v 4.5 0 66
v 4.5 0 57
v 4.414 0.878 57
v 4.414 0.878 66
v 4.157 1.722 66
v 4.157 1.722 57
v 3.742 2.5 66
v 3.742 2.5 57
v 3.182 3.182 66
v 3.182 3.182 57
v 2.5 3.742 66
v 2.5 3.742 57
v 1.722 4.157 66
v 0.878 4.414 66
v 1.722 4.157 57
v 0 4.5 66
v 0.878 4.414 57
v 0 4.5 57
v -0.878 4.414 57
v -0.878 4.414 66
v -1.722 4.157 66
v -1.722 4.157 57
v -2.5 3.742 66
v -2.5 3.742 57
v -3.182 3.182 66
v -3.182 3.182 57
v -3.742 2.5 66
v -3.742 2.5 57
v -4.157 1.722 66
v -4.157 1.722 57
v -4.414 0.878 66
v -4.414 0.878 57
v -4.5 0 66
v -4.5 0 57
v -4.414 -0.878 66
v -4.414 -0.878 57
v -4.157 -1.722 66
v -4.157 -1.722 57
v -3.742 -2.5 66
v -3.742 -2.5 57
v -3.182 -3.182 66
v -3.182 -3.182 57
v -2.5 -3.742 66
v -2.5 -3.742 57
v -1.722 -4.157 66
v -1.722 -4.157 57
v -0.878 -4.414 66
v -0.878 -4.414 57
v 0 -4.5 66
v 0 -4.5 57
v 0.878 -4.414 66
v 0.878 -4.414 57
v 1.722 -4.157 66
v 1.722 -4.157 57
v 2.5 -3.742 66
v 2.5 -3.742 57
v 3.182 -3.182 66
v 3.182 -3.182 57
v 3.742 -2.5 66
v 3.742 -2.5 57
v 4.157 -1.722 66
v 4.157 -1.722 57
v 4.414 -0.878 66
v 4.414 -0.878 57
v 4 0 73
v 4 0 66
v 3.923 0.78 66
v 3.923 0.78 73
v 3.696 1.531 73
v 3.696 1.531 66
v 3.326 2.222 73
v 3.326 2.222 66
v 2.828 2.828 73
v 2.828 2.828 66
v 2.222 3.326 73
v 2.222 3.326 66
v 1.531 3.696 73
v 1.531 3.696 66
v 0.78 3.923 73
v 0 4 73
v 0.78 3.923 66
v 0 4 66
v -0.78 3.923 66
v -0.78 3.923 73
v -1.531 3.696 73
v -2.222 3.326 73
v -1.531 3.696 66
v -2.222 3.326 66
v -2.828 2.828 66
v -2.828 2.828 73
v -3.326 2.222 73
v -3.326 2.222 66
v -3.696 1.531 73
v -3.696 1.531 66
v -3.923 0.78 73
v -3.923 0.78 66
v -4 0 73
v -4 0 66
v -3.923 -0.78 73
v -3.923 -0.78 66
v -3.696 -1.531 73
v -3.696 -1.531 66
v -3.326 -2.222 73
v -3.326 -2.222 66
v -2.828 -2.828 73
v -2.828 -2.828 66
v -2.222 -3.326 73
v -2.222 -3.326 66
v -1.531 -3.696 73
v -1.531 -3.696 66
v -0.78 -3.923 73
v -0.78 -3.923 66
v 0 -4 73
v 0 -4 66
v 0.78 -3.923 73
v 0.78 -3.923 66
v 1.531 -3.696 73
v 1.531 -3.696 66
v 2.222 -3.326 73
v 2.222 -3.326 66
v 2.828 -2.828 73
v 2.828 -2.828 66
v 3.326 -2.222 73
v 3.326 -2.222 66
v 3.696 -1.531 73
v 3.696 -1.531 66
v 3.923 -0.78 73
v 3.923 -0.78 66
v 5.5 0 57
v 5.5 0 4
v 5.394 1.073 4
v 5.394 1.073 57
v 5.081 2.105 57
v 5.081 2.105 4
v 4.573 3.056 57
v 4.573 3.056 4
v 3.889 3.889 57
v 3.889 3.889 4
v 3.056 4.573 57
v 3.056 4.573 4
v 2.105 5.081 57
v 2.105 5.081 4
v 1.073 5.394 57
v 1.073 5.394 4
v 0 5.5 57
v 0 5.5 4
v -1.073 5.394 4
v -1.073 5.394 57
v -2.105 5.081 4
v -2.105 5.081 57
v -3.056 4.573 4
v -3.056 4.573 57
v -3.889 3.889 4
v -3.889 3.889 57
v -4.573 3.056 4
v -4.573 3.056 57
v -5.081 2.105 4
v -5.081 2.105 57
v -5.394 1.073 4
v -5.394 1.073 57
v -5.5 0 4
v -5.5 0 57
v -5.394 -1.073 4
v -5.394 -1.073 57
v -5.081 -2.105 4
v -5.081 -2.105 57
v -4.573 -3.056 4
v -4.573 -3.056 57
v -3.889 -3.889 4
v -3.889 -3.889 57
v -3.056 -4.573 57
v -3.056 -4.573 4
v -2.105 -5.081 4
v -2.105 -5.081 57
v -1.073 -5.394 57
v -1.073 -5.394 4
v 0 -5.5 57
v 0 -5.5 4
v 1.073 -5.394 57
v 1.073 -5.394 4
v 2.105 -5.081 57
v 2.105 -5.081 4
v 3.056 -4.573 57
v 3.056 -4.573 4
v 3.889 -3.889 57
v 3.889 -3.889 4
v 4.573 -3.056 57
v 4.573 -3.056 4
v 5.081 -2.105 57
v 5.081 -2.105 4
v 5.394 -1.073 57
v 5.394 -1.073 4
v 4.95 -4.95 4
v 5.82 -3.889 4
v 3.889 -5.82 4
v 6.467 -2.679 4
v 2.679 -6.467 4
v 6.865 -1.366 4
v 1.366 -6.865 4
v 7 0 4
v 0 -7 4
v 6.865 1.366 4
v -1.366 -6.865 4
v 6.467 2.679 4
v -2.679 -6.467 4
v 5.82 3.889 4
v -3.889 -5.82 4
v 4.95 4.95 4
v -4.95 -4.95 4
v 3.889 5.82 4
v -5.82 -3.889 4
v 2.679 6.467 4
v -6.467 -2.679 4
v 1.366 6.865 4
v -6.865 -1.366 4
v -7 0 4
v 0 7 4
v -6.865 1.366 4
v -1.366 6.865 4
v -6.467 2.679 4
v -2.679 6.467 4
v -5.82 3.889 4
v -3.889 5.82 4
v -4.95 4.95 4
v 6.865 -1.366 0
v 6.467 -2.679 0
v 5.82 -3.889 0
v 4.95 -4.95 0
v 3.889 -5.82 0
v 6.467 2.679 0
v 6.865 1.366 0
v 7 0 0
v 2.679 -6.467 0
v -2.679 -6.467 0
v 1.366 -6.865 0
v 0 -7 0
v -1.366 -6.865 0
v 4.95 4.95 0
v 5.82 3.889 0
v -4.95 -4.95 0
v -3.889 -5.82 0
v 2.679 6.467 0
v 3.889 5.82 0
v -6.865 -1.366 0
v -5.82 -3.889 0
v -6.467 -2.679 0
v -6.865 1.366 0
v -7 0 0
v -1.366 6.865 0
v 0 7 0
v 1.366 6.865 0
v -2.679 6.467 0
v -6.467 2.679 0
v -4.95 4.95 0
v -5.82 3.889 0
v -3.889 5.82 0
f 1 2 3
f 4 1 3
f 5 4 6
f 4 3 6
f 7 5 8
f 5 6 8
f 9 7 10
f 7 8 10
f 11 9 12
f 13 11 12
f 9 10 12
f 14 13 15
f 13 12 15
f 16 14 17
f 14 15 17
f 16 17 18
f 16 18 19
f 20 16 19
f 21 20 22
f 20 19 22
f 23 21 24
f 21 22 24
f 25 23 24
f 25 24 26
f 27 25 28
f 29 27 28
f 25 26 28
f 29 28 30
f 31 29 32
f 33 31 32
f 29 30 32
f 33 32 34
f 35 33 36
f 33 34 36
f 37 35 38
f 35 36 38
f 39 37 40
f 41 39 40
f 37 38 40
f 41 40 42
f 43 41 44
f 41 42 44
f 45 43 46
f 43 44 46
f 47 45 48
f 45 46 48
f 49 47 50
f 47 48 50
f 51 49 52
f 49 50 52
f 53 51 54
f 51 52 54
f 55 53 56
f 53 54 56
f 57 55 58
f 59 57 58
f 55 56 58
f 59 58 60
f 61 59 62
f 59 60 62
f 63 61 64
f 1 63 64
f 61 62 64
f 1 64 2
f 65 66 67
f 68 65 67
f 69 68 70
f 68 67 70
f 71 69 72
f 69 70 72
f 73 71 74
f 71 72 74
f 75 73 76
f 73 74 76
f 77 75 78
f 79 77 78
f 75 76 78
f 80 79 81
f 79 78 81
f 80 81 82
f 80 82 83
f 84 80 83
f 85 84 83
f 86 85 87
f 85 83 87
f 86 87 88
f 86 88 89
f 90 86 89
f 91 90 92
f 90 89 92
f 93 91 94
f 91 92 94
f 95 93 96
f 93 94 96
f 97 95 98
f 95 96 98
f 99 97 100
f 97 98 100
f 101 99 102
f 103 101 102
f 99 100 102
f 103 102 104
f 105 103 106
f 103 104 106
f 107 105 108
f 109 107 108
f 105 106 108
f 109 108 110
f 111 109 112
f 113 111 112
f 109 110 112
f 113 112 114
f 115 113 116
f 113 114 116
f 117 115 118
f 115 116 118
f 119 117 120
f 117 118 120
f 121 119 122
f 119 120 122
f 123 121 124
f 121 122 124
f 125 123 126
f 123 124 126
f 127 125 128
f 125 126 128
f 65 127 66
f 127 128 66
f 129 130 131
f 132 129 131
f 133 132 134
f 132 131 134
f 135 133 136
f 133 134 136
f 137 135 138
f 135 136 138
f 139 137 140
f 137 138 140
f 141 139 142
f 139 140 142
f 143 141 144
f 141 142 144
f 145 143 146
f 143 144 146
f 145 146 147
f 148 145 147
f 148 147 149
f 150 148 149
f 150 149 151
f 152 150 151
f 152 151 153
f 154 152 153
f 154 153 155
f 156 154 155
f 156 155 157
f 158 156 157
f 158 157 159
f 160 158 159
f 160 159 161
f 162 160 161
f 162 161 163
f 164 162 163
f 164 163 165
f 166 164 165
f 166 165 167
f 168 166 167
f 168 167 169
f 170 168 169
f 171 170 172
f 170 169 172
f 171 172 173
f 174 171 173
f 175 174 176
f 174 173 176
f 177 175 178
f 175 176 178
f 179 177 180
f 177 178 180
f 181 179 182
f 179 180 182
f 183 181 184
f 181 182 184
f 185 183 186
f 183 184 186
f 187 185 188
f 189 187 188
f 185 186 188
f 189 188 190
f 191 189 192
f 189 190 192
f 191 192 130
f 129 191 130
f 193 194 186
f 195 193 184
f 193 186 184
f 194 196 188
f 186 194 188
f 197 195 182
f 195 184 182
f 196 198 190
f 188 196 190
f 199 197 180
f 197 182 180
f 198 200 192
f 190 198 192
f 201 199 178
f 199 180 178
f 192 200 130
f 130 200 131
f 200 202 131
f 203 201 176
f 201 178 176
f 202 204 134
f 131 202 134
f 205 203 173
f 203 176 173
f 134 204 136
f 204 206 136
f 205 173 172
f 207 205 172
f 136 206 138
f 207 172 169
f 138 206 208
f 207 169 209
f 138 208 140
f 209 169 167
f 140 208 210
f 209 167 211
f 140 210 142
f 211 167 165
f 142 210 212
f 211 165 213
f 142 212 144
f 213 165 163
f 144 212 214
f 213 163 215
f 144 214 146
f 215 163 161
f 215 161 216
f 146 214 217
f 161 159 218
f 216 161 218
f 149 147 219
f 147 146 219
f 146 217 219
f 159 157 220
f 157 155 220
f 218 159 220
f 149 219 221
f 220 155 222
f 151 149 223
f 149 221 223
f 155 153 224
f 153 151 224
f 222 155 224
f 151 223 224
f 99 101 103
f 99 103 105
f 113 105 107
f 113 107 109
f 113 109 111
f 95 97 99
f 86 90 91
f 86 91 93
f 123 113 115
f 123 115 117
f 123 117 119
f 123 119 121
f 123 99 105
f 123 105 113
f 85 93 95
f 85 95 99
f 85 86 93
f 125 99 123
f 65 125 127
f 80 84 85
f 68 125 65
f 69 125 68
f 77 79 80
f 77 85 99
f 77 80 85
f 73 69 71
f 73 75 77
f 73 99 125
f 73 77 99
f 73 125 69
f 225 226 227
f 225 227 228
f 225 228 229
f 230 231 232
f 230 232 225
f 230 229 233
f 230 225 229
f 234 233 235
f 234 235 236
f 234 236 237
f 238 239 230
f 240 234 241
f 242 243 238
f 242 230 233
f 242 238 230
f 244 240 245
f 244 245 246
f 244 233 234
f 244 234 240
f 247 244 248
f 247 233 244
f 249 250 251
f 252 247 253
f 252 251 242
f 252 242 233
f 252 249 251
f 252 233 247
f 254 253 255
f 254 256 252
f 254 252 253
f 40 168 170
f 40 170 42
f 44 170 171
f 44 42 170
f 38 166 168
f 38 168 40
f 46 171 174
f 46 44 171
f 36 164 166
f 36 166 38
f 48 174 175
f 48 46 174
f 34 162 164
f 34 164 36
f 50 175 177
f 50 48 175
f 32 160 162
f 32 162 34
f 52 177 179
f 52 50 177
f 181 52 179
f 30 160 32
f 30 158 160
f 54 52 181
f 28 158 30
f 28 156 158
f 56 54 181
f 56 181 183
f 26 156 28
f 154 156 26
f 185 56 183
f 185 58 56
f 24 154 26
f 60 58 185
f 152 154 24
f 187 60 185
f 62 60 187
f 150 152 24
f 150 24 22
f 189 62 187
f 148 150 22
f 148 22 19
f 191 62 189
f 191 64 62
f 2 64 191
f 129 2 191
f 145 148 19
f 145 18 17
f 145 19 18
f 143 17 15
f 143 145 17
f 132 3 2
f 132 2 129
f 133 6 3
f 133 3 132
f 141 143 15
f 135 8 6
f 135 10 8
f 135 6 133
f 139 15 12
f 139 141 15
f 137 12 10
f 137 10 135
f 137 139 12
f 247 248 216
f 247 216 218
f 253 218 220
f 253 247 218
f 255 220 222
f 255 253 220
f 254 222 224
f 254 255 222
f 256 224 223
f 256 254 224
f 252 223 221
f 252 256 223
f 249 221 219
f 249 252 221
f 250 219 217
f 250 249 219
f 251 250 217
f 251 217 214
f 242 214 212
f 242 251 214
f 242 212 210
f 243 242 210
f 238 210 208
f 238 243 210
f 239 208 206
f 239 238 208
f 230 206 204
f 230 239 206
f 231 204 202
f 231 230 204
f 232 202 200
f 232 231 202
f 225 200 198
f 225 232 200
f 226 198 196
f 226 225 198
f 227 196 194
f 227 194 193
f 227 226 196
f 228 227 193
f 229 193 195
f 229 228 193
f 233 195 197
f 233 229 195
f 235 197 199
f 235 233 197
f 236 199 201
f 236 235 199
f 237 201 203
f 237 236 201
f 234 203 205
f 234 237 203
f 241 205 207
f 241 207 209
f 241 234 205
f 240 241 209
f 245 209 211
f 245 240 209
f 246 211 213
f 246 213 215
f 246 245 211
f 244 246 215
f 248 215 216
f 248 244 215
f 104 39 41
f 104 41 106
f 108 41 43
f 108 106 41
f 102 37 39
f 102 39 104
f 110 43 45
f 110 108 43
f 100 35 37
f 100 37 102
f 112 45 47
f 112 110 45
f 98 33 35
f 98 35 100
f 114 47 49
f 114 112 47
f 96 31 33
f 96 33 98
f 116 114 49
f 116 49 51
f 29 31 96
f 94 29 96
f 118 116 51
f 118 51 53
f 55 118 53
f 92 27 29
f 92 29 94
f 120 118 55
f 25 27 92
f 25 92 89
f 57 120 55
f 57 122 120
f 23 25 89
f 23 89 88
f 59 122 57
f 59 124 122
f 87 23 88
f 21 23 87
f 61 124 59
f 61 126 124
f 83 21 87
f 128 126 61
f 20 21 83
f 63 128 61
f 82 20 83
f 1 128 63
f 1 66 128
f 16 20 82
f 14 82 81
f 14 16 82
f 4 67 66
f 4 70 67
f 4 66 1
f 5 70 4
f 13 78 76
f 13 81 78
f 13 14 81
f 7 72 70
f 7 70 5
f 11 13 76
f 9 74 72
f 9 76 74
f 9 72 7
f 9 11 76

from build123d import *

# Parameters (mm, degrees)
SKETCH1_R      = 5.5
EXTRUDE1_DEPTH = 66
EXTRUDE2_START = -9
SKETCH3_R      = 5.5
SKETCH3_R_2    = 4.5
EXTRUDE2_DEPTH = 9
SKETCH4_R      = 7
EXTRUDE3_DEPTH = 4
SKETCH5_R      = 4
EXTRUDE4_DEPTH = 7


with BuildPart() as part:
    # Sketch1 → Extrude1 (new body)
    with BuildSketch(Plane.XY):
        Circle(SKETCH1_R)
    extrude(amount=EXTRUDE1_DEPTH)

    # Sketch3 → Extrude2 (cut)
    with BuildSketch(Plane.XY.offset(66).offset(EXTRUDE2_START)):
        Circle(SKETCH3_R)
        Circle(SKETCH3_R_2, mode=Mode.SUBTRACT)
    extrude(amount=EXTRUDE2_DEPTH, mode=Mode.SUBTRACT)

    # Sketch4 → Extrude3 (add)
    with BuildSketch(Plane(origin=(0, 0, 0), x_dir=(-1, 0, 0), z_dir=(0, 0, -1))):
        Circle(SKETCH4_R)
    extrude(amount=-EXTRUDE3_DEPTH)

    # Sketch5 → Extrude4 (add)
    with BuildSketch(Plane.XY.offset(66)):
        Circle(SKETCH5_R)
    extrude(amount=EXTRUDE4_DEPTH)


solid = part.part
